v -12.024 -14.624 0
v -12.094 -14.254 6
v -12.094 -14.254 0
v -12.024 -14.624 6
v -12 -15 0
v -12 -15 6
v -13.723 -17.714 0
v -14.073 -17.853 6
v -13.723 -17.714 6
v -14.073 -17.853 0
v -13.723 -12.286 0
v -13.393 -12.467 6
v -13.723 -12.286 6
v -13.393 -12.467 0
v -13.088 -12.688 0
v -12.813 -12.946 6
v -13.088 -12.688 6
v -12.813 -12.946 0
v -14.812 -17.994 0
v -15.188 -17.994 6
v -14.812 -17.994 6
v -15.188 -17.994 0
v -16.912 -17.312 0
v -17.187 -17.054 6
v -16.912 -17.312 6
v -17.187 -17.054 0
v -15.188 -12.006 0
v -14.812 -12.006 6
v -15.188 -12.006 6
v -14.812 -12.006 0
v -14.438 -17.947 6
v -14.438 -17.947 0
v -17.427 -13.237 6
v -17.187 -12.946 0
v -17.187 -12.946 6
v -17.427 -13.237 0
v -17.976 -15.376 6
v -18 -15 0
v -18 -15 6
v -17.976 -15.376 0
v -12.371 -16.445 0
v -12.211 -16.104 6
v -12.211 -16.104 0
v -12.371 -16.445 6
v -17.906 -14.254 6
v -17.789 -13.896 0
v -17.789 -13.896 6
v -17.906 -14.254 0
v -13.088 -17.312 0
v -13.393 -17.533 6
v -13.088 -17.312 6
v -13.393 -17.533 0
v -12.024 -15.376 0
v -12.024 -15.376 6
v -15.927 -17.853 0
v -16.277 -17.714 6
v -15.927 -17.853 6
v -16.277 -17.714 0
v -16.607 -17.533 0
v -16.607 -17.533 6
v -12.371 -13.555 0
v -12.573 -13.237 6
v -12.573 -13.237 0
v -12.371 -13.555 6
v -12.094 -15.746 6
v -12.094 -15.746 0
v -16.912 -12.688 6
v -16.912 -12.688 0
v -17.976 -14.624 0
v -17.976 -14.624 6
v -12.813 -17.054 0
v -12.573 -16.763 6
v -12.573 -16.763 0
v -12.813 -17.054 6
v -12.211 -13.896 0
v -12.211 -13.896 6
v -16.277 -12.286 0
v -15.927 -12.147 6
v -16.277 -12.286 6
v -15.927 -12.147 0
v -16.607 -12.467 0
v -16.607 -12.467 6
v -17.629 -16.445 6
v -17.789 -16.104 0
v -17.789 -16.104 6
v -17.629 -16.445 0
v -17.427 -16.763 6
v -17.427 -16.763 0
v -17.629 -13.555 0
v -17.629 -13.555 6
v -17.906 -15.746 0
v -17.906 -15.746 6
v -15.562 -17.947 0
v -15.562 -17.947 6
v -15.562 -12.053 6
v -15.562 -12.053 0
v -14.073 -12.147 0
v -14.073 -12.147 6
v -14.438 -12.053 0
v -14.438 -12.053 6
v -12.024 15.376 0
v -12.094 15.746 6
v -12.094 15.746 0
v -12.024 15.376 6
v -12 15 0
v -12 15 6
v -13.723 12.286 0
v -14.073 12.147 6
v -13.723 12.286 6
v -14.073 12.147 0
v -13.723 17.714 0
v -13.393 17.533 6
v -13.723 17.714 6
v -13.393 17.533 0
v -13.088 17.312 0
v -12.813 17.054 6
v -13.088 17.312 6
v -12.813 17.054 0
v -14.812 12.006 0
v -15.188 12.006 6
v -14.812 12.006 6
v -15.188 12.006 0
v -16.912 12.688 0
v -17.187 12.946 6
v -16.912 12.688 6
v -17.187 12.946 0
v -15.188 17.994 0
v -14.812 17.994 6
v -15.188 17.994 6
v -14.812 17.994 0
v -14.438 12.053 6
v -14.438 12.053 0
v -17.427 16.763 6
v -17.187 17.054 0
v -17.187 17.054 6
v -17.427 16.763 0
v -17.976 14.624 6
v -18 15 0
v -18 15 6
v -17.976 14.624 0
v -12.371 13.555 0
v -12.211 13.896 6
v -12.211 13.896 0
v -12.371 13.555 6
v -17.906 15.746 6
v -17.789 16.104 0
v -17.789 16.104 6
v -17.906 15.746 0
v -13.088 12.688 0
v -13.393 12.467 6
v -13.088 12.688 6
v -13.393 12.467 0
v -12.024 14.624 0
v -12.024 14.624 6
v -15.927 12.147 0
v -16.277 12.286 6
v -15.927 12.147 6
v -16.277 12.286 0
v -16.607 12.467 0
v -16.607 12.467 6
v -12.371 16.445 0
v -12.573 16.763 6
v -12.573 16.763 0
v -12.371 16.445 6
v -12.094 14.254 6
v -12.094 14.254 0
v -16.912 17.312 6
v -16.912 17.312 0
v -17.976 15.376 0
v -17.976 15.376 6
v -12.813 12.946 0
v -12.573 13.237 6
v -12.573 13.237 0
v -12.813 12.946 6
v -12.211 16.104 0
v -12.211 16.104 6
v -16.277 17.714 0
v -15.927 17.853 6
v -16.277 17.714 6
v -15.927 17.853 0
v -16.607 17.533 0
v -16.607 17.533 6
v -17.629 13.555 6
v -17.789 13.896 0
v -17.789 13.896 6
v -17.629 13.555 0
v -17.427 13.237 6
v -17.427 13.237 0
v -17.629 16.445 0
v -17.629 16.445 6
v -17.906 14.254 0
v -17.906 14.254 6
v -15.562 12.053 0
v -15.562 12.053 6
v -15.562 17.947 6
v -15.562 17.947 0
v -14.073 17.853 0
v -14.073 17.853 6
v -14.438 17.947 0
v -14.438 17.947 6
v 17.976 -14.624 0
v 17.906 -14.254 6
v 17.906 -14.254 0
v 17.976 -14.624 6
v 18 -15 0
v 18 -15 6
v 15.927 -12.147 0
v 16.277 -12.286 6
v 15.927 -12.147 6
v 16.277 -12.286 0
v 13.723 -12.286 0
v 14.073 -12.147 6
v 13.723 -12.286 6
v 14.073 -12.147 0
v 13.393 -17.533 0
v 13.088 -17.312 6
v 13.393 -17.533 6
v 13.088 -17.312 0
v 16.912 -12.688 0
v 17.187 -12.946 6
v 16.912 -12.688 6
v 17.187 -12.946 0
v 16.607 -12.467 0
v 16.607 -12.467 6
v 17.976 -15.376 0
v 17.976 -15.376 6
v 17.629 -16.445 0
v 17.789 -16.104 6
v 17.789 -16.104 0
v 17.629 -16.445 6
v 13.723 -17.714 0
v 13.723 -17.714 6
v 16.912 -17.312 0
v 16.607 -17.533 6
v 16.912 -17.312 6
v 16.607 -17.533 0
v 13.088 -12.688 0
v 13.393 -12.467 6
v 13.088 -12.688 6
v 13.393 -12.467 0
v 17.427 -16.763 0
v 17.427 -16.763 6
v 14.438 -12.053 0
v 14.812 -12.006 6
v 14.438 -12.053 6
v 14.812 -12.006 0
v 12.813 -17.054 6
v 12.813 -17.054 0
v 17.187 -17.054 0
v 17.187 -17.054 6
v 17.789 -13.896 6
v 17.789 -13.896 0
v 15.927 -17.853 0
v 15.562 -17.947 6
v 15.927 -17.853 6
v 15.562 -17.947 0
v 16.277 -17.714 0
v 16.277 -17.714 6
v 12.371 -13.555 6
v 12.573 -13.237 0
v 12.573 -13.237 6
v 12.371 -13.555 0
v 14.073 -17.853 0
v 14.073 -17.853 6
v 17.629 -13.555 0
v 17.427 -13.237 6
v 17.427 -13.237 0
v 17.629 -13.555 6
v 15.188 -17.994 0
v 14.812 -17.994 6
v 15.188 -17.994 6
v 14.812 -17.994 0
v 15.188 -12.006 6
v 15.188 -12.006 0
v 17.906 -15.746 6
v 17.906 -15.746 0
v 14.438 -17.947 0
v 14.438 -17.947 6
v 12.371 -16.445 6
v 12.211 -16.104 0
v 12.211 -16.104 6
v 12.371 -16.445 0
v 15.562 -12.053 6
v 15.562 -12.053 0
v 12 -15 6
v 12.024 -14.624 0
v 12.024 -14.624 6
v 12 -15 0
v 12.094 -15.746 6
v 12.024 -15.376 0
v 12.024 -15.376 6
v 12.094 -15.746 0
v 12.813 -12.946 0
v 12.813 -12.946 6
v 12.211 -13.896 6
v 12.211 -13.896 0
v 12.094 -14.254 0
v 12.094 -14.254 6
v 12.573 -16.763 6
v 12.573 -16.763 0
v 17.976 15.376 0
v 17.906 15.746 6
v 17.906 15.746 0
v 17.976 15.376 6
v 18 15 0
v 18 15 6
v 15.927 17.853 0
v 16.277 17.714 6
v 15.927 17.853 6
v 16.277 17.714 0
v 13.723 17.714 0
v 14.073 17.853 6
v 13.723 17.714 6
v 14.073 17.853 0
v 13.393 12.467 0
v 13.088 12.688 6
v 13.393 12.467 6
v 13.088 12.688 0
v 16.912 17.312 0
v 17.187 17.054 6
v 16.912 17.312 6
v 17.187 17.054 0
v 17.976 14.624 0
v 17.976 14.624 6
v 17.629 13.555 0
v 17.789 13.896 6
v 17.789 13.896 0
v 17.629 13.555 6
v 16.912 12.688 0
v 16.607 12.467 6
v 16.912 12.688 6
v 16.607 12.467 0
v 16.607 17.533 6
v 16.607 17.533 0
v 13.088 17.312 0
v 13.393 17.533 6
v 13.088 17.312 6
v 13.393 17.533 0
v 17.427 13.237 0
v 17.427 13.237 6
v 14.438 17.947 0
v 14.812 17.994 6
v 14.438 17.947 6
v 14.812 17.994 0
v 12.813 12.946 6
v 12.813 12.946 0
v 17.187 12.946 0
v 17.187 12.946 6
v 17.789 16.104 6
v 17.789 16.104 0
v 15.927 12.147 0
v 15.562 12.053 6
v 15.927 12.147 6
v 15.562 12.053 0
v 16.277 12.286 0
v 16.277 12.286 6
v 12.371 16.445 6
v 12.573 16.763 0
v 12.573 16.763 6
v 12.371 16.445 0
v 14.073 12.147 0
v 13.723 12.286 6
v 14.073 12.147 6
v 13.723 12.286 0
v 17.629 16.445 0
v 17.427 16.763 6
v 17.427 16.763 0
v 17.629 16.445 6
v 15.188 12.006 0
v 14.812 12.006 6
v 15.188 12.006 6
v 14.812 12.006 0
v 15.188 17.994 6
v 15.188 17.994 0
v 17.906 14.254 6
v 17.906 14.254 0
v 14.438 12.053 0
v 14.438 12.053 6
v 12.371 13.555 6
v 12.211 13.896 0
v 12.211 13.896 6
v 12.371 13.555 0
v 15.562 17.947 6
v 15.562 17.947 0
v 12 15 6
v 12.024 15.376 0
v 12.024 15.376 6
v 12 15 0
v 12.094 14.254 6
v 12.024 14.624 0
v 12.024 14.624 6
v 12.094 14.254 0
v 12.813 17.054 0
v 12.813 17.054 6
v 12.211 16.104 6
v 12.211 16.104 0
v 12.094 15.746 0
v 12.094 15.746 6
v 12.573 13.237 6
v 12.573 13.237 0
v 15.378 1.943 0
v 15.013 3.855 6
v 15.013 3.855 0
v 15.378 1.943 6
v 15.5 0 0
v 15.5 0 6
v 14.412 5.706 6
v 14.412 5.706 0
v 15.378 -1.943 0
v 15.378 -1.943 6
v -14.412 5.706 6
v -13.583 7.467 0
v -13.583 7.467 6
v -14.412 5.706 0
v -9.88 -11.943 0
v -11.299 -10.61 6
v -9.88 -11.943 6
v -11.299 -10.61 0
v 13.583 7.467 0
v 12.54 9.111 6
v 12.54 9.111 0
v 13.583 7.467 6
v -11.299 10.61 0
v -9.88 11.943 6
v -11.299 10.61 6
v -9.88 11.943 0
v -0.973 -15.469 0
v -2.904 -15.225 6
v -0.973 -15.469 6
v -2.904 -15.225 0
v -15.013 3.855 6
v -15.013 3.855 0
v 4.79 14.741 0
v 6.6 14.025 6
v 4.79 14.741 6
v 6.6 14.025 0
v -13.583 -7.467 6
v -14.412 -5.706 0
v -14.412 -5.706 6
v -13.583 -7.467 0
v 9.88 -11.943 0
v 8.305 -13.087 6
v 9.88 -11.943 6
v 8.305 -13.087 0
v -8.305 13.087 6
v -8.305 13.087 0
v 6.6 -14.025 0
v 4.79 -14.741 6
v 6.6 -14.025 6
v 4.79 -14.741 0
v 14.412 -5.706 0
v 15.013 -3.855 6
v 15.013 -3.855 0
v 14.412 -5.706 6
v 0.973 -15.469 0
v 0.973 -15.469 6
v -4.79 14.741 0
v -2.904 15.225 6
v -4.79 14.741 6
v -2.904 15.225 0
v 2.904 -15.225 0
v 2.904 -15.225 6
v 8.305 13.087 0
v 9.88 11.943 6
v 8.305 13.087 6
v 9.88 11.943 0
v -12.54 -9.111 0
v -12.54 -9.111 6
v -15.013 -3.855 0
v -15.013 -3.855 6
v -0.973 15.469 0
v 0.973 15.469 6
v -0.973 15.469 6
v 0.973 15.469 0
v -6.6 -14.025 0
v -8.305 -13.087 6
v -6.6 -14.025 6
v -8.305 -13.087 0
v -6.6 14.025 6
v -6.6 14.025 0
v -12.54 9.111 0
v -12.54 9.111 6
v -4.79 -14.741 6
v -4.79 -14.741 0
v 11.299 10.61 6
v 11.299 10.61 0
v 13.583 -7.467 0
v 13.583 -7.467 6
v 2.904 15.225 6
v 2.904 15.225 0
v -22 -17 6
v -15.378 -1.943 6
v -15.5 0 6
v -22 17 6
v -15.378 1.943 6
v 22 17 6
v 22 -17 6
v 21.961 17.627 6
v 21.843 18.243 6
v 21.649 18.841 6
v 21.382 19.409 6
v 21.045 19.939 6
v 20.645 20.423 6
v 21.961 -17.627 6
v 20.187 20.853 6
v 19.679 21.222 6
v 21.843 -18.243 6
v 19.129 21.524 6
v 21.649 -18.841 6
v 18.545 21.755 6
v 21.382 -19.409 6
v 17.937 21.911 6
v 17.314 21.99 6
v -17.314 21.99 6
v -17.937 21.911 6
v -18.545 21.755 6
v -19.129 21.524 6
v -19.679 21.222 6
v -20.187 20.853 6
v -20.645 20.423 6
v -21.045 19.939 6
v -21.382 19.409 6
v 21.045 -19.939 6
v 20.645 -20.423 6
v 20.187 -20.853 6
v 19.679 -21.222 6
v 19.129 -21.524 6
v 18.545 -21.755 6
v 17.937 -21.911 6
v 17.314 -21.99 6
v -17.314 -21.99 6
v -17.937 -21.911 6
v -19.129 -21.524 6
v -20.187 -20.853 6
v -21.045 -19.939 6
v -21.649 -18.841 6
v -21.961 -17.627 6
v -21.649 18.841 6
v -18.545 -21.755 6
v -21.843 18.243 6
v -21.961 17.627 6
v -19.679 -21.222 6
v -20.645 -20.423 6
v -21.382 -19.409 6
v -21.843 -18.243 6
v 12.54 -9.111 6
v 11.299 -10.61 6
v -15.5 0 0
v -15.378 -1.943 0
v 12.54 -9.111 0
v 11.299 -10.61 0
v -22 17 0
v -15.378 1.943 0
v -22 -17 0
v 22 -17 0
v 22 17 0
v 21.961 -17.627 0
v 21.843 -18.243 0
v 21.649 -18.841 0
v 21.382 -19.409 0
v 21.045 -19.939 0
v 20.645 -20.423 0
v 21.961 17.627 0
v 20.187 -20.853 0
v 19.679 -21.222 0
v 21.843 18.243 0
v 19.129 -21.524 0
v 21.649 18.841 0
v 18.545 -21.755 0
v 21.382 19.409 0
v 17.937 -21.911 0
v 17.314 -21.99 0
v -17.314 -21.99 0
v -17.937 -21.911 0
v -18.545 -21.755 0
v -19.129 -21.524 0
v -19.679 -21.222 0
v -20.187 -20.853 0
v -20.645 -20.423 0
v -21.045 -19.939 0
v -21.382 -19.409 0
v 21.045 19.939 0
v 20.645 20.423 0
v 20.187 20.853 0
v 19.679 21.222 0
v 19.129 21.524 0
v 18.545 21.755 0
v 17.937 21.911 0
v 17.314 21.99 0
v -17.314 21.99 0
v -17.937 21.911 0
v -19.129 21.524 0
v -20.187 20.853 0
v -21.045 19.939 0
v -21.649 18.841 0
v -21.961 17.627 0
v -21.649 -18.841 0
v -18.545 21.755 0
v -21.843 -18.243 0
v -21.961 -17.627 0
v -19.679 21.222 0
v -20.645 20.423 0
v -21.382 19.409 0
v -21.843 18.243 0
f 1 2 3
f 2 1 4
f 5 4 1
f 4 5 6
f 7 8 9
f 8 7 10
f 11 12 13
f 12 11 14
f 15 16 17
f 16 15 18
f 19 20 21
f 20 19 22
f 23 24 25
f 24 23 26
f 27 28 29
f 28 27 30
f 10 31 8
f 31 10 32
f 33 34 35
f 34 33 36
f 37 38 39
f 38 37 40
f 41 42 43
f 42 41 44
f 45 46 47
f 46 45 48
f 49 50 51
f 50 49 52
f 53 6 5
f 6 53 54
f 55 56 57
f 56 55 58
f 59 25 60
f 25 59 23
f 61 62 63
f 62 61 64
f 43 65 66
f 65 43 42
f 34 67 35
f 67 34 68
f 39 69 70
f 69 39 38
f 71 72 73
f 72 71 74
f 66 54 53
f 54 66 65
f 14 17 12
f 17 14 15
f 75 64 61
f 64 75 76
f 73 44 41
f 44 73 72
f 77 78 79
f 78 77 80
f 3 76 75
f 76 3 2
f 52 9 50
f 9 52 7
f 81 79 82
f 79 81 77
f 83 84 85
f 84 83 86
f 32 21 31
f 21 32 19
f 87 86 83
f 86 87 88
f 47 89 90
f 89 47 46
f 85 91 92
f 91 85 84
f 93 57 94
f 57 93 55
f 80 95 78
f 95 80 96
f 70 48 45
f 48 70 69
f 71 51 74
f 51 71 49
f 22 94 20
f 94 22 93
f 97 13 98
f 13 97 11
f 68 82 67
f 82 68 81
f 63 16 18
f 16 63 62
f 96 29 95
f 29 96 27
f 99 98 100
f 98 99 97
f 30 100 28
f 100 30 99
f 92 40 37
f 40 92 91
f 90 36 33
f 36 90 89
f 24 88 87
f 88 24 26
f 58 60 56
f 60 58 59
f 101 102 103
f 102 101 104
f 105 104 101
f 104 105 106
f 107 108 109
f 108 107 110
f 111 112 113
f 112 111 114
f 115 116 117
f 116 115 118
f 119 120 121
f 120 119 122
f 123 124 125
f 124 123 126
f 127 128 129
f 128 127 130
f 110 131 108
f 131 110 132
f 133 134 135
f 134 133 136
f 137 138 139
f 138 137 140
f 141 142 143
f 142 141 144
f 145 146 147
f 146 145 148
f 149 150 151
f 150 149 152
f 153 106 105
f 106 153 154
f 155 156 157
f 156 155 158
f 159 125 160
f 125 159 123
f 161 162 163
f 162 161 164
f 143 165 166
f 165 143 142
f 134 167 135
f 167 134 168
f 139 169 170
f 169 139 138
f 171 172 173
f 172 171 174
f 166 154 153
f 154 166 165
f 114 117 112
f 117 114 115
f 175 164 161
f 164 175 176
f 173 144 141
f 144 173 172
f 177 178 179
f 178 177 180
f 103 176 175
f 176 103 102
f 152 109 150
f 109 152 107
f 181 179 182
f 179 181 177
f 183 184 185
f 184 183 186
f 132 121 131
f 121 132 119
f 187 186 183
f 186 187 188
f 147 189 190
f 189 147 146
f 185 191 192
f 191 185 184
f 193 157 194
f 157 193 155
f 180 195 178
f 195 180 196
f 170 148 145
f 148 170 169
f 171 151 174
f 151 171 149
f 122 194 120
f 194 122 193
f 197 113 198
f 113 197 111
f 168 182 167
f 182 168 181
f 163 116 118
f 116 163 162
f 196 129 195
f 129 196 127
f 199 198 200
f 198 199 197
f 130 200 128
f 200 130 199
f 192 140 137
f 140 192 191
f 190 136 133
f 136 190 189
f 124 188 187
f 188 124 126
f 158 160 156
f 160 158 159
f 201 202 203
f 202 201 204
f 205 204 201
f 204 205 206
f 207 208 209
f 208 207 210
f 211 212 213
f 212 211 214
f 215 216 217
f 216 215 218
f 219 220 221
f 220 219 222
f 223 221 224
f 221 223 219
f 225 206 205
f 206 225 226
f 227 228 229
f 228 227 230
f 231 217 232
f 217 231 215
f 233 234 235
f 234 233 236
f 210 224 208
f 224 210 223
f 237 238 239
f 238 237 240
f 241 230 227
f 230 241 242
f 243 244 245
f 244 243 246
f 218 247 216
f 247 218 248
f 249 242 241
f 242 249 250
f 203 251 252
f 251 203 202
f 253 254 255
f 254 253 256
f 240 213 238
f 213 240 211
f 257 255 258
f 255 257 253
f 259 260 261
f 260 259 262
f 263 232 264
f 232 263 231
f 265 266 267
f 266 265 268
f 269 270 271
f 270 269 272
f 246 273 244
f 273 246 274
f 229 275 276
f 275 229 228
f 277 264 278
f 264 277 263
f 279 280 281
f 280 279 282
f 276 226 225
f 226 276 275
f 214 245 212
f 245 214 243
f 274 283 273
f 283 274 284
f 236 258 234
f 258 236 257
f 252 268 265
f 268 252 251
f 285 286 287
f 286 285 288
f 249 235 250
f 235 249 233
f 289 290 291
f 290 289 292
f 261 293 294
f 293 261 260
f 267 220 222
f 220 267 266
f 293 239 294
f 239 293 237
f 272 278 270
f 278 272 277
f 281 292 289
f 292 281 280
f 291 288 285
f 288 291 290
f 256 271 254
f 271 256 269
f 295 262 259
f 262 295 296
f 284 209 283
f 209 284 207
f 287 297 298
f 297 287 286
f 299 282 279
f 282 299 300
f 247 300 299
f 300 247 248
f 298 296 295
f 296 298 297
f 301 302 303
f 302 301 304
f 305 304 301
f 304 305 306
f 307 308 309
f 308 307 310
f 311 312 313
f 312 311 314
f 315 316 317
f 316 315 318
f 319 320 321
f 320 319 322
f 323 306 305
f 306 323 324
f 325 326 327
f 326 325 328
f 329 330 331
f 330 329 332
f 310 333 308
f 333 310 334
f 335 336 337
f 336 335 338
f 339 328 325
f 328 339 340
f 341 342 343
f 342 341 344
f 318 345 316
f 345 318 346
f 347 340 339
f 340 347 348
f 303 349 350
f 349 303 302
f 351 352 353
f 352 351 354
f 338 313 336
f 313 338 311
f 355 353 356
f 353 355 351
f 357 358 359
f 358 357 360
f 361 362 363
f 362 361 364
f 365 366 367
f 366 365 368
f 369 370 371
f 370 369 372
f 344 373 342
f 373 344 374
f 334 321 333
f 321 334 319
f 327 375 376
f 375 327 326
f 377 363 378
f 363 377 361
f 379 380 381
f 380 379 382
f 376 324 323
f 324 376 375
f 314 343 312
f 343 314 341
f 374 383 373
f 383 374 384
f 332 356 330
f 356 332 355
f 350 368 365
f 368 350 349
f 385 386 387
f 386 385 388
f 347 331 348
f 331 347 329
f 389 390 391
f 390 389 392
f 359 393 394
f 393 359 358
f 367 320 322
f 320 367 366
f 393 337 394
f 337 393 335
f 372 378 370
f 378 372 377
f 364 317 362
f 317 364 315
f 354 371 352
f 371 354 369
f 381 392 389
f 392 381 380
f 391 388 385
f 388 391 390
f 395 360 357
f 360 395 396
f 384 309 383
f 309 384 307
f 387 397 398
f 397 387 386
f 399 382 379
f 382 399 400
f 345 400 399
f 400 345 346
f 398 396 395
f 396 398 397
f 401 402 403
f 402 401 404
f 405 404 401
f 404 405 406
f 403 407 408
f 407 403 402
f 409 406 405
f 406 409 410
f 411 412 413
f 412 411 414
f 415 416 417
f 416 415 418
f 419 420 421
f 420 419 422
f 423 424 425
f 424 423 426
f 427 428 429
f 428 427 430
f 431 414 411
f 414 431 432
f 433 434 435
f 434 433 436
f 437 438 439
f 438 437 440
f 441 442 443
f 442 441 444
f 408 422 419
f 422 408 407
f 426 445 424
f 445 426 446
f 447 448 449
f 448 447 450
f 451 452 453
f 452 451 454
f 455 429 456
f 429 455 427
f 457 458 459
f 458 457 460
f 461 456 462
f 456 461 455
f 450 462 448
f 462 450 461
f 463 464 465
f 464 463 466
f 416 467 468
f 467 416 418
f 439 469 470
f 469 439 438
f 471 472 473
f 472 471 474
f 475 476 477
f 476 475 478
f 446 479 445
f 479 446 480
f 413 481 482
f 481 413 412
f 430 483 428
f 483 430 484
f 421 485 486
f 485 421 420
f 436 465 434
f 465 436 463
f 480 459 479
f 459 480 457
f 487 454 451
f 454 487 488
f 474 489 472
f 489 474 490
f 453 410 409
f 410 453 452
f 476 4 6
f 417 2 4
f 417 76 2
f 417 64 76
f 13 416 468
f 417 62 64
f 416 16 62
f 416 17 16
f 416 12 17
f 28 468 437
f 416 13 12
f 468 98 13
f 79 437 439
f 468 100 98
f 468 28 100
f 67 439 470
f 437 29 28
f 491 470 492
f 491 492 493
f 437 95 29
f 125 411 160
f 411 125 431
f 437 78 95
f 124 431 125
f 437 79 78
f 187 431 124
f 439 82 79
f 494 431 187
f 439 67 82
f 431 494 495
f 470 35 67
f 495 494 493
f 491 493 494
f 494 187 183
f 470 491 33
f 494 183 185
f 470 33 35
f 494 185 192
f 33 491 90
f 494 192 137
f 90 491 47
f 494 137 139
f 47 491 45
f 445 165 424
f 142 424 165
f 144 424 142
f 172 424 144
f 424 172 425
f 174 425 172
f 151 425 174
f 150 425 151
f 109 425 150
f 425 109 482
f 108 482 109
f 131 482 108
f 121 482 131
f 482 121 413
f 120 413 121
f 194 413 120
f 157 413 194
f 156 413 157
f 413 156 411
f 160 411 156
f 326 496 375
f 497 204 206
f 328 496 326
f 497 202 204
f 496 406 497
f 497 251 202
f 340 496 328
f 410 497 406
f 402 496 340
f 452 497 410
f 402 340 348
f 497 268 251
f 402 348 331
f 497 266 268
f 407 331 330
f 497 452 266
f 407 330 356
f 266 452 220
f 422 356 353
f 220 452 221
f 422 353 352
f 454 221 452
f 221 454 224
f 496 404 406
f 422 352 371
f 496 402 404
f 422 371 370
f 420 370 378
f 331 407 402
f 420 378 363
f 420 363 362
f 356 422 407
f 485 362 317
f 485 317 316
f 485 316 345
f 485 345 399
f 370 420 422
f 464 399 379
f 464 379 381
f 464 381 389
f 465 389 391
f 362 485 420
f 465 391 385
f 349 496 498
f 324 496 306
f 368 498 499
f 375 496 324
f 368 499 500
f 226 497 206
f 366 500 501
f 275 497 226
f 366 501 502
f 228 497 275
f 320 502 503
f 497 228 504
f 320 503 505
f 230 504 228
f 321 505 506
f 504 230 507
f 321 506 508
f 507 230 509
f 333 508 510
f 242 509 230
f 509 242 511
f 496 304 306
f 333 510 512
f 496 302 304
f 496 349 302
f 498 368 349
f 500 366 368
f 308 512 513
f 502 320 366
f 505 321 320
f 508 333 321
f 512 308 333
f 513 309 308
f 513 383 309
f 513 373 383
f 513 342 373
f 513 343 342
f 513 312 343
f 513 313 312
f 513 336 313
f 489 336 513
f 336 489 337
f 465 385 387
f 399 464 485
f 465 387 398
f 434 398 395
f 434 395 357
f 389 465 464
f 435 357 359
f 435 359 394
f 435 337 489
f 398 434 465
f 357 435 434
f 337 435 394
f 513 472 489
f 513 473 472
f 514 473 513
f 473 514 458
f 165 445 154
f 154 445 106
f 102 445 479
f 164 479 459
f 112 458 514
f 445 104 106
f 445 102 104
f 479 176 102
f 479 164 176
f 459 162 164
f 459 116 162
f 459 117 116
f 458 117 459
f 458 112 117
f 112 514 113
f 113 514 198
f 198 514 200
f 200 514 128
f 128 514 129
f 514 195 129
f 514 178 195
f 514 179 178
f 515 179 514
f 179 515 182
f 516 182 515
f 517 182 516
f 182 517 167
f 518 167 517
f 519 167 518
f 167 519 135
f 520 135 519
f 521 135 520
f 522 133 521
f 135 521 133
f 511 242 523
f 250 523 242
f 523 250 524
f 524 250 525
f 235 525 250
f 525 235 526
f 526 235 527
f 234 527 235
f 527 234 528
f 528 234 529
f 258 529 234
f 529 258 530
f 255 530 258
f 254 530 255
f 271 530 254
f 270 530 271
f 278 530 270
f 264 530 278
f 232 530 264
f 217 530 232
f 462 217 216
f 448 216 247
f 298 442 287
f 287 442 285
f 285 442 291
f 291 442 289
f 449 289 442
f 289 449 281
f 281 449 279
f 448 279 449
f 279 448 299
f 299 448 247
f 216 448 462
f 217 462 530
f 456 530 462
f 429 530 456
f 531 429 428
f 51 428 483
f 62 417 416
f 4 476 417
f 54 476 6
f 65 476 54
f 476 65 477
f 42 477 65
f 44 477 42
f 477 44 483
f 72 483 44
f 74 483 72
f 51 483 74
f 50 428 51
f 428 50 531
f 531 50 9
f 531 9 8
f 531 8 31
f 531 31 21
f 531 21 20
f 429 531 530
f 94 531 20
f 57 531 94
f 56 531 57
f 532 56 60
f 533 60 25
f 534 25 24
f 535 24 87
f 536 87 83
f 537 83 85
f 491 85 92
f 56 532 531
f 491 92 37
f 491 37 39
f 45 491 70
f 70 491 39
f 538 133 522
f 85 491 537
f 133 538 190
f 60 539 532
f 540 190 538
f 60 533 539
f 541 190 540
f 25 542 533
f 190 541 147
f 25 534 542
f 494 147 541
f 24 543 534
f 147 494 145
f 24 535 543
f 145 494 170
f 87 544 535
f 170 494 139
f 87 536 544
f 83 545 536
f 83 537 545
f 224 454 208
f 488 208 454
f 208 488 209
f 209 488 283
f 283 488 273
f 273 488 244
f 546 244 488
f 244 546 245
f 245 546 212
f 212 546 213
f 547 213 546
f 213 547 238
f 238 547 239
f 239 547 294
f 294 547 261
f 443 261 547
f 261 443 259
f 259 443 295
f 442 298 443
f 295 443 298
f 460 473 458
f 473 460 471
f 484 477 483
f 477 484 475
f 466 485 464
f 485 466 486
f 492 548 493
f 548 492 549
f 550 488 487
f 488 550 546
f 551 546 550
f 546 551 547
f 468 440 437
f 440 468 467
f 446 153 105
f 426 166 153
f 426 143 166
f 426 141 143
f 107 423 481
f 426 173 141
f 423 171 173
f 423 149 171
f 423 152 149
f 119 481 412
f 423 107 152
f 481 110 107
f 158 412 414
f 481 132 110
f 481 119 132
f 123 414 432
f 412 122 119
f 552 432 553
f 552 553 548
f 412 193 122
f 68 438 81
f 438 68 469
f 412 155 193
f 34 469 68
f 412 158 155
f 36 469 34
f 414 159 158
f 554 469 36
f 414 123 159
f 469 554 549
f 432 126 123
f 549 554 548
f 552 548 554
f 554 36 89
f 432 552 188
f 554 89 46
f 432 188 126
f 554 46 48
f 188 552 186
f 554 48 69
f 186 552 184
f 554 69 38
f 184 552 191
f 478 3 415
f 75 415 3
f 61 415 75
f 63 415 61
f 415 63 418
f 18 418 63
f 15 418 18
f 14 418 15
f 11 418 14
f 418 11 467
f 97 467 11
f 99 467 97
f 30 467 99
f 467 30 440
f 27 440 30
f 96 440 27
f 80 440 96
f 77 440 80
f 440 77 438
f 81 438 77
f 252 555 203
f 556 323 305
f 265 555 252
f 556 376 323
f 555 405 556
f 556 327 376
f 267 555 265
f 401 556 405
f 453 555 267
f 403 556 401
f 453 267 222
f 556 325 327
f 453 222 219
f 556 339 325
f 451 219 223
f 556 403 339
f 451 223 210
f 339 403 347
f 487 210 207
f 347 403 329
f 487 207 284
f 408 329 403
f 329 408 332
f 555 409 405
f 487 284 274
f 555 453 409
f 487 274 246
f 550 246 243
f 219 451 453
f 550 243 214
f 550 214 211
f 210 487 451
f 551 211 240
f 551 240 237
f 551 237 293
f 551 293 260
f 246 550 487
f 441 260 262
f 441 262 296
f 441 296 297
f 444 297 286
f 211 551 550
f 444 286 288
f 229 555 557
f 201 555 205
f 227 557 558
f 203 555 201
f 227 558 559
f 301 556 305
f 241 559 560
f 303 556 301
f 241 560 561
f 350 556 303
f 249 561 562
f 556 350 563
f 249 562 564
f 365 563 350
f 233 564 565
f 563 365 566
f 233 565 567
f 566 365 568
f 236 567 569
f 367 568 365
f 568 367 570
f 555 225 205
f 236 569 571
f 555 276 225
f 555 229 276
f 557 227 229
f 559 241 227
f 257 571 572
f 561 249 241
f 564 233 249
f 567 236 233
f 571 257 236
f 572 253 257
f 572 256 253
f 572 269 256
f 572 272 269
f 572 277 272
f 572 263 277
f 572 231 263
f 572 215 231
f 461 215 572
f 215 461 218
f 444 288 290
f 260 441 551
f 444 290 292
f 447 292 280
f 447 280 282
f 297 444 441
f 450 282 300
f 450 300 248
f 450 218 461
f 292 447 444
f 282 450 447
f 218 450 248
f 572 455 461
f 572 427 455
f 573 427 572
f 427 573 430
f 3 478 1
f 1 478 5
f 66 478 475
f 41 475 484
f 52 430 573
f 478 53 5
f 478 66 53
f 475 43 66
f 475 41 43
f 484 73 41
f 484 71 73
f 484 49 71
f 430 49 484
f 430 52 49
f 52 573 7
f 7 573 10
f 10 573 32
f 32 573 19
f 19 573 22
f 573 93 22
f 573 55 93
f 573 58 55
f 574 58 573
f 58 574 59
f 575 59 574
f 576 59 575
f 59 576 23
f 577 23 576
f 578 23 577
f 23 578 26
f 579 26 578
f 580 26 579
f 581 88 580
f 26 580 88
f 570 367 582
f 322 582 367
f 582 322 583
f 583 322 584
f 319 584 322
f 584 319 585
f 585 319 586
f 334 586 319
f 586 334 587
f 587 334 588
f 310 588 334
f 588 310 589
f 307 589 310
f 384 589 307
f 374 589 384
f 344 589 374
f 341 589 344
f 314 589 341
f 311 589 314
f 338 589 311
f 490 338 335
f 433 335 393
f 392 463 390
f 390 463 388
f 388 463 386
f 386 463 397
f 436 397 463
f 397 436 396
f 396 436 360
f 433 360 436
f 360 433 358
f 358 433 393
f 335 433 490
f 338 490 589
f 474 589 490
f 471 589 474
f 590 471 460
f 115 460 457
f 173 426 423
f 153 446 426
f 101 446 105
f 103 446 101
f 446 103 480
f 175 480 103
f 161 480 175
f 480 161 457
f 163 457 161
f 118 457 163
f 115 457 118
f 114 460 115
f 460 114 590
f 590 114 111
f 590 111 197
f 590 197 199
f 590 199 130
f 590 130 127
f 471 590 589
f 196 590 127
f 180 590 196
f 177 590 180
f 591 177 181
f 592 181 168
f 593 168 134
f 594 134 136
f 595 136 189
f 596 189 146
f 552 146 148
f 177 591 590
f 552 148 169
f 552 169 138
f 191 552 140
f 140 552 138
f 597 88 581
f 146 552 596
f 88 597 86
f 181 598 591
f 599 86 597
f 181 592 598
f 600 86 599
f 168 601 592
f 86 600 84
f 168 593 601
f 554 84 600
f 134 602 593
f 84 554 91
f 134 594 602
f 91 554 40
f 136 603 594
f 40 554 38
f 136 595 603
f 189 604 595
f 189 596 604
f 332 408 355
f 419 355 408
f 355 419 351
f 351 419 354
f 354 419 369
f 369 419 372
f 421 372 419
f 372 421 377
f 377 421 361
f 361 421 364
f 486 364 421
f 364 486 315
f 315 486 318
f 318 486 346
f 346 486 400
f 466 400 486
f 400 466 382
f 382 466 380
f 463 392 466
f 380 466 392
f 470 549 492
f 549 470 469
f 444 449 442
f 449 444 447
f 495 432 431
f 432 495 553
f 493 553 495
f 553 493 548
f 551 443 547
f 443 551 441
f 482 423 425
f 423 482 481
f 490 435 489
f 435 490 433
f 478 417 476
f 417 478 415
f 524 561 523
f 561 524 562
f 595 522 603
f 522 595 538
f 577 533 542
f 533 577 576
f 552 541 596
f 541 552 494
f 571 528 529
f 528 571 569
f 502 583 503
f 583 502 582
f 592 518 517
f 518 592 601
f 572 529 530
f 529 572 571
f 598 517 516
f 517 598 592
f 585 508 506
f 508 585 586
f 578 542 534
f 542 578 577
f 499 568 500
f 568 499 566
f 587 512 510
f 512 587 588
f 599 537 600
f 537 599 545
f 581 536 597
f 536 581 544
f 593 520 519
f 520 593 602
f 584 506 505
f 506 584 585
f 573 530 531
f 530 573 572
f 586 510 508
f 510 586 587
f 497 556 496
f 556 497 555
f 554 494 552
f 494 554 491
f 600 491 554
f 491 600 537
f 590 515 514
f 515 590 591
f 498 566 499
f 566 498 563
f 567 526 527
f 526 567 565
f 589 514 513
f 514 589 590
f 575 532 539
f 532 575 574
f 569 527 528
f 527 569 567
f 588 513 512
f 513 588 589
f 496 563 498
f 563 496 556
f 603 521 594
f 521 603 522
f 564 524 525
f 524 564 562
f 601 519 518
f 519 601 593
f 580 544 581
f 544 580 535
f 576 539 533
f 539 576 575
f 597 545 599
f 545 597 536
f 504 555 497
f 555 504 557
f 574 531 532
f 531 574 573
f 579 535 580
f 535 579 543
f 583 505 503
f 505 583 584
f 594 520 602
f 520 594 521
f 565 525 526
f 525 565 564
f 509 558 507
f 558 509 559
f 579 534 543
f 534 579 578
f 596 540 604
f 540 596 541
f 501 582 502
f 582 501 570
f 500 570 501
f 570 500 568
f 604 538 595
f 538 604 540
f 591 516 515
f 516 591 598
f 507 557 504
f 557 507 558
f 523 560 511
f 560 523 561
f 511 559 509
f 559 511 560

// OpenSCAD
$fn = 50;


difference() {
	union() {
		hull() {
			translate(v = [-17.0000000000, 17.0000000000, 0]) {
				cylinder(h = 6, r = 5);
			}
			translate(v = [17.0000000000, 17.0000000000, 0]) {
				cylinder(h = 6, r = 5);
			}
			translate(v = [-17.0000000000, -17.0000000000, 0]) {
				cylinder(h = 6, r = 5);
			}
			translate(v = [17.0000000000, -17.0000000000, 0]) {
				cylinder(h = 6, r = 5);
			}
		}
	}
	union() {
		#translate(v = [-15.0000000000, -15.0000000000, -100.0000000000]) {
			cylinder(h = 200, r = 3.0000000000);
		}
		#translate(v = [-15.0000000000, 15.0000000000, -100.0000000000]) {
			cylinder(h = 200, r = 3.0000000000);
		}
		#translate(v = [15.0000000000, -15.0000000000, -100.0000000000]) {
			cylinder(h = 200, r = 3.0000000000);
		}
		#translate(v = [15.0000000000, 15.0000000000, -100.0000000000]) {
			cylinder(h = 200, r = 3.0000000000);
		}
		#cylinder(h = 6, r = 15.5000000000);
	}
}
